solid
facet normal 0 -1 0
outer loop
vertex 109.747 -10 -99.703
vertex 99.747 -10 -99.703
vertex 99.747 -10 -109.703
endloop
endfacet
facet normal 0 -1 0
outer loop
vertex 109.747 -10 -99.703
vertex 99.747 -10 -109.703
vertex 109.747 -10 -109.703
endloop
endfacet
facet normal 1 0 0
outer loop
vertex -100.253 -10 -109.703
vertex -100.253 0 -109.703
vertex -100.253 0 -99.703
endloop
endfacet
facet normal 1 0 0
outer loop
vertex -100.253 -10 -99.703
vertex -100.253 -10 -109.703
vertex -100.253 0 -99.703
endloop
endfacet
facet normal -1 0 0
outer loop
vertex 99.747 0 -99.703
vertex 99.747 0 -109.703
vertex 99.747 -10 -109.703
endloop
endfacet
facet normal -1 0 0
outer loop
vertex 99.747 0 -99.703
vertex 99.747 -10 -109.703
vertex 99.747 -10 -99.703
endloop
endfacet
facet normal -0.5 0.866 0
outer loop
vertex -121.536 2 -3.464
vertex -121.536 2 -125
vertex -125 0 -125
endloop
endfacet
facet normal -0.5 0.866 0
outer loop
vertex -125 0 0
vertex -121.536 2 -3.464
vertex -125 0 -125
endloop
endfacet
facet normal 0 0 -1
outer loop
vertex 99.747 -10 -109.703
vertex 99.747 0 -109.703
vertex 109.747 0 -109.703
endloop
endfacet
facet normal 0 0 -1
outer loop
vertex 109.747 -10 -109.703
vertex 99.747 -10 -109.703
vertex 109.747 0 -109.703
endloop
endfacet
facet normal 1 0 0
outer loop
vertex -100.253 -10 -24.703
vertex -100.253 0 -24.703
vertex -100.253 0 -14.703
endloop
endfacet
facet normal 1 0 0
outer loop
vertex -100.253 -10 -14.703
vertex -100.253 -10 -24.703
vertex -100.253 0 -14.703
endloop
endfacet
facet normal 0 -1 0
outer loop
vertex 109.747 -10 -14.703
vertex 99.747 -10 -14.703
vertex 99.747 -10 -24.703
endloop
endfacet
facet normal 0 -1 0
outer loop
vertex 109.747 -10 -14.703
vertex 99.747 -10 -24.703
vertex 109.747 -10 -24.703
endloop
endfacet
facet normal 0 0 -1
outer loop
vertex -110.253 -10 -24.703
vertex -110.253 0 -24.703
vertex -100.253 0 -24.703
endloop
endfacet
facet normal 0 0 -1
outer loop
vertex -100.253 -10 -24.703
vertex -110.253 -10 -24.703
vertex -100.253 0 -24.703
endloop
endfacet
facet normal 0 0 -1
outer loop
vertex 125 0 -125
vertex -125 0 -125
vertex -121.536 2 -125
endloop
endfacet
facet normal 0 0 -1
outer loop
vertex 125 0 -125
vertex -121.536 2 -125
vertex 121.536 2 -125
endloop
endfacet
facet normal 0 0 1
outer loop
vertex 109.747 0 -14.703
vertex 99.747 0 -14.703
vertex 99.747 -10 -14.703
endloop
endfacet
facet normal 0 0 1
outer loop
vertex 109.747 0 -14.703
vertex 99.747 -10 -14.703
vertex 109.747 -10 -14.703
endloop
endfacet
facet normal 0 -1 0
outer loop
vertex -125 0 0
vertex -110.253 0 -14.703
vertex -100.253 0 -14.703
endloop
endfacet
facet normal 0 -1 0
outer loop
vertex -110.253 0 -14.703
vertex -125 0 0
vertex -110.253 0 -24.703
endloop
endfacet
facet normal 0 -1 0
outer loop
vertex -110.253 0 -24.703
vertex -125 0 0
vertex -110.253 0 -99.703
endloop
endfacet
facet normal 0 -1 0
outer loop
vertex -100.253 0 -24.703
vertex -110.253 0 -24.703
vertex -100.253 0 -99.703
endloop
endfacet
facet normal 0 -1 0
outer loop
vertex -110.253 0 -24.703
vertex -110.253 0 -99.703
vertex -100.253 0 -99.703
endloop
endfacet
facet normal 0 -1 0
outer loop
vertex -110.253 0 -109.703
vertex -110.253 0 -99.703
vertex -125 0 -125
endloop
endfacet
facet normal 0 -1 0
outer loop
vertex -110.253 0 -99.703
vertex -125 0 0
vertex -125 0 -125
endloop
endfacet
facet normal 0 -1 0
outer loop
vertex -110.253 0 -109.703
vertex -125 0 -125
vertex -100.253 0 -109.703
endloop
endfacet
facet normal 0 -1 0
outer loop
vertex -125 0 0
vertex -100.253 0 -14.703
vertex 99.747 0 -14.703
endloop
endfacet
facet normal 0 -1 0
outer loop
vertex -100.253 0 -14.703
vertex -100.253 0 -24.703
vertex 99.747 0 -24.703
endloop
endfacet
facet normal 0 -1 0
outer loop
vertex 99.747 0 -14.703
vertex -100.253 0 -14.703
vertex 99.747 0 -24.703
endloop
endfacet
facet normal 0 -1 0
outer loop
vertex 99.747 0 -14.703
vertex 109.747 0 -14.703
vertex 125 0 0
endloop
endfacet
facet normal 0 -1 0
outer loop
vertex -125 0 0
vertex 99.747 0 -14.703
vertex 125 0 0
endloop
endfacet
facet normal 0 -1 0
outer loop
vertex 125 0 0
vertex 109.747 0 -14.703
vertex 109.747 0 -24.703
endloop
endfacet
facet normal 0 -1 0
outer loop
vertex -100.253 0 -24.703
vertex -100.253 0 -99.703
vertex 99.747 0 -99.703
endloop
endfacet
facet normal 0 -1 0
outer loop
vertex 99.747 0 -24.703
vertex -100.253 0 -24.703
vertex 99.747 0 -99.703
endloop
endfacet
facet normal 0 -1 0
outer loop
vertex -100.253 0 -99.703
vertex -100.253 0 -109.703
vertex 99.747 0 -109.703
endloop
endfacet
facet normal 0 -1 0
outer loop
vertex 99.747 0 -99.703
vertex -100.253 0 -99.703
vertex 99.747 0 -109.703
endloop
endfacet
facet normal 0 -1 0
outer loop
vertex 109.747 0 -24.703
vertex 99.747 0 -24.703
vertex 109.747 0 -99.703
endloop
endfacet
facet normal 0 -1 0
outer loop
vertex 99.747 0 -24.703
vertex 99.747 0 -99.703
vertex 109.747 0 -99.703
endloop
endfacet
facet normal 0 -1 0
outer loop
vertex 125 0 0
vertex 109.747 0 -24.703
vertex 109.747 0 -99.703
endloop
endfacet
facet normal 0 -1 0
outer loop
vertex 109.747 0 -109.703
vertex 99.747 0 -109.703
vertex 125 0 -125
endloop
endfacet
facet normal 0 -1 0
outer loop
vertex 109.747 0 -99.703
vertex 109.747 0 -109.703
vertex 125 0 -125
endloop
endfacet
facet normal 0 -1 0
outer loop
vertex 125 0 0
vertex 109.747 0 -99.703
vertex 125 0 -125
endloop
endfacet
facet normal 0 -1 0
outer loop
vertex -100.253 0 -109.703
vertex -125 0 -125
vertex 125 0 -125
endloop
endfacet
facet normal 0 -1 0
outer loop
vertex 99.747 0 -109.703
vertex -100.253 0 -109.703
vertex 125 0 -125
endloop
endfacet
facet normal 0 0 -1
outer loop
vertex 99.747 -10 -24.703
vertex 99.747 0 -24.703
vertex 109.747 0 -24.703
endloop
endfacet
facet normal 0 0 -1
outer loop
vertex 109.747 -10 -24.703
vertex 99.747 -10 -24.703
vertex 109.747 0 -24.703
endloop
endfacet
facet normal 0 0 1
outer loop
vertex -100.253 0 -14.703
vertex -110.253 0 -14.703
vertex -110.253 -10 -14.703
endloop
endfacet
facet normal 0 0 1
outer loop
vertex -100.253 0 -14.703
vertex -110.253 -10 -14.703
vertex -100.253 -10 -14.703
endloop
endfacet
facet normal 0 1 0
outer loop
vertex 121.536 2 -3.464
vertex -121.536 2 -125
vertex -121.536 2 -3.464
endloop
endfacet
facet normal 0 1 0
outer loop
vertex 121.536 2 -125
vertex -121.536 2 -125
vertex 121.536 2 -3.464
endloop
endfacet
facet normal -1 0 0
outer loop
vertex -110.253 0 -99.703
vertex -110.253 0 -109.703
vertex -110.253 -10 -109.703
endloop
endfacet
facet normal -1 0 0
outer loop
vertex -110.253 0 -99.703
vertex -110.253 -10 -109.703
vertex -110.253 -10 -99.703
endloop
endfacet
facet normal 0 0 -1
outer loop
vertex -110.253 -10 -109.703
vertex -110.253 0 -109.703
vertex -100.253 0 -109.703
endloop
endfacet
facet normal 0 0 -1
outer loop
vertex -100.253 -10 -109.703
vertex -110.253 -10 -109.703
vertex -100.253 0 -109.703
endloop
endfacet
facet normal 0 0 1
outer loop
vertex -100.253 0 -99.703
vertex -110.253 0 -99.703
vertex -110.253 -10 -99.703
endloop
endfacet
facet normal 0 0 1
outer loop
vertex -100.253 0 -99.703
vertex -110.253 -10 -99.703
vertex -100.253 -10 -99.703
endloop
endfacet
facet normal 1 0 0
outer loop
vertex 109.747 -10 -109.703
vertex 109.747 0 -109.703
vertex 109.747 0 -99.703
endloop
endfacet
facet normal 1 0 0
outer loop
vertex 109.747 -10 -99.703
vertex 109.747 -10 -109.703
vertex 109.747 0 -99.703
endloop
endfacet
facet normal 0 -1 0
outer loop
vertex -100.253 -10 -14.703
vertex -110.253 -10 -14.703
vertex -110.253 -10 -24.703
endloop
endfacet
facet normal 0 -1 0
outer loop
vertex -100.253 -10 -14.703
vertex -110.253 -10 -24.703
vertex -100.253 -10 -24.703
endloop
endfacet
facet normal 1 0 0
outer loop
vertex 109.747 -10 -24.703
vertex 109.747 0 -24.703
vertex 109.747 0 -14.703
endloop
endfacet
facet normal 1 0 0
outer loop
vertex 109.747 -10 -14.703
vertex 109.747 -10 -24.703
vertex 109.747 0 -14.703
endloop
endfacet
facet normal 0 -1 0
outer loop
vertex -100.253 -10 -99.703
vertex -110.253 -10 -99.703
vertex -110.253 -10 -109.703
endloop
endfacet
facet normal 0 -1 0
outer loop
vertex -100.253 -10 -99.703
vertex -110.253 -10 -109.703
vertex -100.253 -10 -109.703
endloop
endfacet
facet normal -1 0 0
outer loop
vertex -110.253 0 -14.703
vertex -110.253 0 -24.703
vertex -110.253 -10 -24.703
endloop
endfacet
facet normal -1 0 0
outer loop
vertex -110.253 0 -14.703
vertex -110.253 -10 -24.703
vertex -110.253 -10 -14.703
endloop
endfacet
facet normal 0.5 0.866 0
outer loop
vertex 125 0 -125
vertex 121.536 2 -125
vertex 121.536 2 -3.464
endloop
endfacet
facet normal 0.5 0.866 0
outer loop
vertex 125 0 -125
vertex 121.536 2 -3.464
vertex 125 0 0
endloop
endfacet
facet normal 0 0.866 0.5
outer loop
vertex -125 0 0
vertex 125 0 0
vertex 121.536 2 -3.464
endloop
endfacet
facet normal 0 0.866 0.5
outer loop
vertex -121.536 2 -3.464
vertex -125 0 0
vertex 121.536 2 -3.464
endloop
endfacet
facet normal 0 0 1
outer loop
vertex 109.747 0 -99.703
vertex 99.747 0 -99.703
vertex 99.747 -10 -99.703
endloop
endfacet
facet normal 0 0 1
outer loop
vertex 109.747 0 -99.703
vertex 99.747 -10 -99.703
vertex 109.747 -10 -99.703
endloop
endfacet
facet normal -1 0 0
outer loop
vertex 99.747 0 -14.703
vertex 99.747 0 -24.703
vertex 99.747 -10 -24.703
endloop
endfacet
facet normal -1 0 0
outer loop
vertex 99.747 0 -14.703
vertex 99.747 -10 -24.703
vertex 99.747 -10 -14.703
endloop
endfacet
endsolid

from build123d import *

# Parameters (mm, degrees)
SKETCH_1_W               = 250
SKETCH_1_H               = 250
EXTRUDE_1_DEPTH          = 2
SKETCH_2_W               = 250
SKETCH_2_H               = 125
CUT_EXTRUDE_1_DEPTH      = 2
SKETCH_6_W               = 10
SKETCH_6_H               = 10
EXTRUDE_3_DEPTH          = 10
CUT_EXTRUDE_2_DEPTH      = 125
CUT_EXTRUDE_3_DEPTH      = 178.059312096
CUT_EXTRUDE_3_DEPTH_BACK = 178.059312096


with BuildPart() as part:
    # 草图1 → 凸台-拉伸1 (new body)
    with BuildSketch(Plane(origin=(0, 0, 0), x_dir=(1, 0, 0), z_dir=(0, 1, 0))):
        Rectangle(SKETCH_1_W, SKETCH_1_H)
    extrude(amount=EXTRUDE_1_DEPTH)

    # 草图2 → 切除-拉伸1 (cut)
    with BuildSketch(Plane(origin=(0, 2, 0), x_dir=(1, 0, 0), z_dir=(0, 1, 0))):
        with Locations((0, -62.5)):
            Rectangle(SKETCH_2_W, SKETCH_2_H)
    extrude(amount=-CUT_EXTRUDE_1_DEPTH, mode=Mode.SUBTRACT)

    # 草图6 → 凸台-拉伸3 (add)
    with BuildSketch(Plane.XZ):
        with Locations((-105.253353702, -19.703268914)):
            Rectangle(SKETCH_6_W, SKETCH_6_H)
        with Locations((-105.253353702, -104.703268914)):
            Rectangle(SKETCH_6_W, SKETCH_6_H)
        with Locations((104.746646298, -19.703268914)):
            Rectangle(SKETCH_6_W, SKETCH_6_H)
        with Locations((104.746646298, -104.703268914)):
            Rectangle(SKETCH_6_W, SKETCH_6_H)
    extrude(amount=EXTRUDE_3_DEPTH)

    # 草图9 → 切除-拉伸2 (cut)
    with BuildSketch(Plane(origin=(0, 0, -125), x_dir=(-1, 0, 0), z_dir=(0, 0, -1))):
        Polygon((-125, 0), (-125, 2), (-121.535898385, 2), align=None)
        Polygon((125, 2), (121.535898385, 2), (125, 0), align=None)
    extrude(amount=-CUT_EXTRUDE_2_DEPTH, mode=Mode.SUBTRACT)

    # 草图11 → 切除-拉伸3 (cut, two sides: drawn at the far end of the back side and taken through both)
    with BuildSketch(Plane(origin=(0, 0, 0), x_dir=(0, 0, -1), z_dir=(1, 0, 0)).offset(-CUT_EXTRUDE_3_DEPTH_BACK)):
        Polygon((0, 2), (0, 0), (3.464101615, 2), align=None)
    extrude(amount=CUT_EXTRUDE_3_DEPTH + CUT_EXTRUDE_3_DEPTH_BACK, mode=Mode.SUBTRACT)


solid = part.part
